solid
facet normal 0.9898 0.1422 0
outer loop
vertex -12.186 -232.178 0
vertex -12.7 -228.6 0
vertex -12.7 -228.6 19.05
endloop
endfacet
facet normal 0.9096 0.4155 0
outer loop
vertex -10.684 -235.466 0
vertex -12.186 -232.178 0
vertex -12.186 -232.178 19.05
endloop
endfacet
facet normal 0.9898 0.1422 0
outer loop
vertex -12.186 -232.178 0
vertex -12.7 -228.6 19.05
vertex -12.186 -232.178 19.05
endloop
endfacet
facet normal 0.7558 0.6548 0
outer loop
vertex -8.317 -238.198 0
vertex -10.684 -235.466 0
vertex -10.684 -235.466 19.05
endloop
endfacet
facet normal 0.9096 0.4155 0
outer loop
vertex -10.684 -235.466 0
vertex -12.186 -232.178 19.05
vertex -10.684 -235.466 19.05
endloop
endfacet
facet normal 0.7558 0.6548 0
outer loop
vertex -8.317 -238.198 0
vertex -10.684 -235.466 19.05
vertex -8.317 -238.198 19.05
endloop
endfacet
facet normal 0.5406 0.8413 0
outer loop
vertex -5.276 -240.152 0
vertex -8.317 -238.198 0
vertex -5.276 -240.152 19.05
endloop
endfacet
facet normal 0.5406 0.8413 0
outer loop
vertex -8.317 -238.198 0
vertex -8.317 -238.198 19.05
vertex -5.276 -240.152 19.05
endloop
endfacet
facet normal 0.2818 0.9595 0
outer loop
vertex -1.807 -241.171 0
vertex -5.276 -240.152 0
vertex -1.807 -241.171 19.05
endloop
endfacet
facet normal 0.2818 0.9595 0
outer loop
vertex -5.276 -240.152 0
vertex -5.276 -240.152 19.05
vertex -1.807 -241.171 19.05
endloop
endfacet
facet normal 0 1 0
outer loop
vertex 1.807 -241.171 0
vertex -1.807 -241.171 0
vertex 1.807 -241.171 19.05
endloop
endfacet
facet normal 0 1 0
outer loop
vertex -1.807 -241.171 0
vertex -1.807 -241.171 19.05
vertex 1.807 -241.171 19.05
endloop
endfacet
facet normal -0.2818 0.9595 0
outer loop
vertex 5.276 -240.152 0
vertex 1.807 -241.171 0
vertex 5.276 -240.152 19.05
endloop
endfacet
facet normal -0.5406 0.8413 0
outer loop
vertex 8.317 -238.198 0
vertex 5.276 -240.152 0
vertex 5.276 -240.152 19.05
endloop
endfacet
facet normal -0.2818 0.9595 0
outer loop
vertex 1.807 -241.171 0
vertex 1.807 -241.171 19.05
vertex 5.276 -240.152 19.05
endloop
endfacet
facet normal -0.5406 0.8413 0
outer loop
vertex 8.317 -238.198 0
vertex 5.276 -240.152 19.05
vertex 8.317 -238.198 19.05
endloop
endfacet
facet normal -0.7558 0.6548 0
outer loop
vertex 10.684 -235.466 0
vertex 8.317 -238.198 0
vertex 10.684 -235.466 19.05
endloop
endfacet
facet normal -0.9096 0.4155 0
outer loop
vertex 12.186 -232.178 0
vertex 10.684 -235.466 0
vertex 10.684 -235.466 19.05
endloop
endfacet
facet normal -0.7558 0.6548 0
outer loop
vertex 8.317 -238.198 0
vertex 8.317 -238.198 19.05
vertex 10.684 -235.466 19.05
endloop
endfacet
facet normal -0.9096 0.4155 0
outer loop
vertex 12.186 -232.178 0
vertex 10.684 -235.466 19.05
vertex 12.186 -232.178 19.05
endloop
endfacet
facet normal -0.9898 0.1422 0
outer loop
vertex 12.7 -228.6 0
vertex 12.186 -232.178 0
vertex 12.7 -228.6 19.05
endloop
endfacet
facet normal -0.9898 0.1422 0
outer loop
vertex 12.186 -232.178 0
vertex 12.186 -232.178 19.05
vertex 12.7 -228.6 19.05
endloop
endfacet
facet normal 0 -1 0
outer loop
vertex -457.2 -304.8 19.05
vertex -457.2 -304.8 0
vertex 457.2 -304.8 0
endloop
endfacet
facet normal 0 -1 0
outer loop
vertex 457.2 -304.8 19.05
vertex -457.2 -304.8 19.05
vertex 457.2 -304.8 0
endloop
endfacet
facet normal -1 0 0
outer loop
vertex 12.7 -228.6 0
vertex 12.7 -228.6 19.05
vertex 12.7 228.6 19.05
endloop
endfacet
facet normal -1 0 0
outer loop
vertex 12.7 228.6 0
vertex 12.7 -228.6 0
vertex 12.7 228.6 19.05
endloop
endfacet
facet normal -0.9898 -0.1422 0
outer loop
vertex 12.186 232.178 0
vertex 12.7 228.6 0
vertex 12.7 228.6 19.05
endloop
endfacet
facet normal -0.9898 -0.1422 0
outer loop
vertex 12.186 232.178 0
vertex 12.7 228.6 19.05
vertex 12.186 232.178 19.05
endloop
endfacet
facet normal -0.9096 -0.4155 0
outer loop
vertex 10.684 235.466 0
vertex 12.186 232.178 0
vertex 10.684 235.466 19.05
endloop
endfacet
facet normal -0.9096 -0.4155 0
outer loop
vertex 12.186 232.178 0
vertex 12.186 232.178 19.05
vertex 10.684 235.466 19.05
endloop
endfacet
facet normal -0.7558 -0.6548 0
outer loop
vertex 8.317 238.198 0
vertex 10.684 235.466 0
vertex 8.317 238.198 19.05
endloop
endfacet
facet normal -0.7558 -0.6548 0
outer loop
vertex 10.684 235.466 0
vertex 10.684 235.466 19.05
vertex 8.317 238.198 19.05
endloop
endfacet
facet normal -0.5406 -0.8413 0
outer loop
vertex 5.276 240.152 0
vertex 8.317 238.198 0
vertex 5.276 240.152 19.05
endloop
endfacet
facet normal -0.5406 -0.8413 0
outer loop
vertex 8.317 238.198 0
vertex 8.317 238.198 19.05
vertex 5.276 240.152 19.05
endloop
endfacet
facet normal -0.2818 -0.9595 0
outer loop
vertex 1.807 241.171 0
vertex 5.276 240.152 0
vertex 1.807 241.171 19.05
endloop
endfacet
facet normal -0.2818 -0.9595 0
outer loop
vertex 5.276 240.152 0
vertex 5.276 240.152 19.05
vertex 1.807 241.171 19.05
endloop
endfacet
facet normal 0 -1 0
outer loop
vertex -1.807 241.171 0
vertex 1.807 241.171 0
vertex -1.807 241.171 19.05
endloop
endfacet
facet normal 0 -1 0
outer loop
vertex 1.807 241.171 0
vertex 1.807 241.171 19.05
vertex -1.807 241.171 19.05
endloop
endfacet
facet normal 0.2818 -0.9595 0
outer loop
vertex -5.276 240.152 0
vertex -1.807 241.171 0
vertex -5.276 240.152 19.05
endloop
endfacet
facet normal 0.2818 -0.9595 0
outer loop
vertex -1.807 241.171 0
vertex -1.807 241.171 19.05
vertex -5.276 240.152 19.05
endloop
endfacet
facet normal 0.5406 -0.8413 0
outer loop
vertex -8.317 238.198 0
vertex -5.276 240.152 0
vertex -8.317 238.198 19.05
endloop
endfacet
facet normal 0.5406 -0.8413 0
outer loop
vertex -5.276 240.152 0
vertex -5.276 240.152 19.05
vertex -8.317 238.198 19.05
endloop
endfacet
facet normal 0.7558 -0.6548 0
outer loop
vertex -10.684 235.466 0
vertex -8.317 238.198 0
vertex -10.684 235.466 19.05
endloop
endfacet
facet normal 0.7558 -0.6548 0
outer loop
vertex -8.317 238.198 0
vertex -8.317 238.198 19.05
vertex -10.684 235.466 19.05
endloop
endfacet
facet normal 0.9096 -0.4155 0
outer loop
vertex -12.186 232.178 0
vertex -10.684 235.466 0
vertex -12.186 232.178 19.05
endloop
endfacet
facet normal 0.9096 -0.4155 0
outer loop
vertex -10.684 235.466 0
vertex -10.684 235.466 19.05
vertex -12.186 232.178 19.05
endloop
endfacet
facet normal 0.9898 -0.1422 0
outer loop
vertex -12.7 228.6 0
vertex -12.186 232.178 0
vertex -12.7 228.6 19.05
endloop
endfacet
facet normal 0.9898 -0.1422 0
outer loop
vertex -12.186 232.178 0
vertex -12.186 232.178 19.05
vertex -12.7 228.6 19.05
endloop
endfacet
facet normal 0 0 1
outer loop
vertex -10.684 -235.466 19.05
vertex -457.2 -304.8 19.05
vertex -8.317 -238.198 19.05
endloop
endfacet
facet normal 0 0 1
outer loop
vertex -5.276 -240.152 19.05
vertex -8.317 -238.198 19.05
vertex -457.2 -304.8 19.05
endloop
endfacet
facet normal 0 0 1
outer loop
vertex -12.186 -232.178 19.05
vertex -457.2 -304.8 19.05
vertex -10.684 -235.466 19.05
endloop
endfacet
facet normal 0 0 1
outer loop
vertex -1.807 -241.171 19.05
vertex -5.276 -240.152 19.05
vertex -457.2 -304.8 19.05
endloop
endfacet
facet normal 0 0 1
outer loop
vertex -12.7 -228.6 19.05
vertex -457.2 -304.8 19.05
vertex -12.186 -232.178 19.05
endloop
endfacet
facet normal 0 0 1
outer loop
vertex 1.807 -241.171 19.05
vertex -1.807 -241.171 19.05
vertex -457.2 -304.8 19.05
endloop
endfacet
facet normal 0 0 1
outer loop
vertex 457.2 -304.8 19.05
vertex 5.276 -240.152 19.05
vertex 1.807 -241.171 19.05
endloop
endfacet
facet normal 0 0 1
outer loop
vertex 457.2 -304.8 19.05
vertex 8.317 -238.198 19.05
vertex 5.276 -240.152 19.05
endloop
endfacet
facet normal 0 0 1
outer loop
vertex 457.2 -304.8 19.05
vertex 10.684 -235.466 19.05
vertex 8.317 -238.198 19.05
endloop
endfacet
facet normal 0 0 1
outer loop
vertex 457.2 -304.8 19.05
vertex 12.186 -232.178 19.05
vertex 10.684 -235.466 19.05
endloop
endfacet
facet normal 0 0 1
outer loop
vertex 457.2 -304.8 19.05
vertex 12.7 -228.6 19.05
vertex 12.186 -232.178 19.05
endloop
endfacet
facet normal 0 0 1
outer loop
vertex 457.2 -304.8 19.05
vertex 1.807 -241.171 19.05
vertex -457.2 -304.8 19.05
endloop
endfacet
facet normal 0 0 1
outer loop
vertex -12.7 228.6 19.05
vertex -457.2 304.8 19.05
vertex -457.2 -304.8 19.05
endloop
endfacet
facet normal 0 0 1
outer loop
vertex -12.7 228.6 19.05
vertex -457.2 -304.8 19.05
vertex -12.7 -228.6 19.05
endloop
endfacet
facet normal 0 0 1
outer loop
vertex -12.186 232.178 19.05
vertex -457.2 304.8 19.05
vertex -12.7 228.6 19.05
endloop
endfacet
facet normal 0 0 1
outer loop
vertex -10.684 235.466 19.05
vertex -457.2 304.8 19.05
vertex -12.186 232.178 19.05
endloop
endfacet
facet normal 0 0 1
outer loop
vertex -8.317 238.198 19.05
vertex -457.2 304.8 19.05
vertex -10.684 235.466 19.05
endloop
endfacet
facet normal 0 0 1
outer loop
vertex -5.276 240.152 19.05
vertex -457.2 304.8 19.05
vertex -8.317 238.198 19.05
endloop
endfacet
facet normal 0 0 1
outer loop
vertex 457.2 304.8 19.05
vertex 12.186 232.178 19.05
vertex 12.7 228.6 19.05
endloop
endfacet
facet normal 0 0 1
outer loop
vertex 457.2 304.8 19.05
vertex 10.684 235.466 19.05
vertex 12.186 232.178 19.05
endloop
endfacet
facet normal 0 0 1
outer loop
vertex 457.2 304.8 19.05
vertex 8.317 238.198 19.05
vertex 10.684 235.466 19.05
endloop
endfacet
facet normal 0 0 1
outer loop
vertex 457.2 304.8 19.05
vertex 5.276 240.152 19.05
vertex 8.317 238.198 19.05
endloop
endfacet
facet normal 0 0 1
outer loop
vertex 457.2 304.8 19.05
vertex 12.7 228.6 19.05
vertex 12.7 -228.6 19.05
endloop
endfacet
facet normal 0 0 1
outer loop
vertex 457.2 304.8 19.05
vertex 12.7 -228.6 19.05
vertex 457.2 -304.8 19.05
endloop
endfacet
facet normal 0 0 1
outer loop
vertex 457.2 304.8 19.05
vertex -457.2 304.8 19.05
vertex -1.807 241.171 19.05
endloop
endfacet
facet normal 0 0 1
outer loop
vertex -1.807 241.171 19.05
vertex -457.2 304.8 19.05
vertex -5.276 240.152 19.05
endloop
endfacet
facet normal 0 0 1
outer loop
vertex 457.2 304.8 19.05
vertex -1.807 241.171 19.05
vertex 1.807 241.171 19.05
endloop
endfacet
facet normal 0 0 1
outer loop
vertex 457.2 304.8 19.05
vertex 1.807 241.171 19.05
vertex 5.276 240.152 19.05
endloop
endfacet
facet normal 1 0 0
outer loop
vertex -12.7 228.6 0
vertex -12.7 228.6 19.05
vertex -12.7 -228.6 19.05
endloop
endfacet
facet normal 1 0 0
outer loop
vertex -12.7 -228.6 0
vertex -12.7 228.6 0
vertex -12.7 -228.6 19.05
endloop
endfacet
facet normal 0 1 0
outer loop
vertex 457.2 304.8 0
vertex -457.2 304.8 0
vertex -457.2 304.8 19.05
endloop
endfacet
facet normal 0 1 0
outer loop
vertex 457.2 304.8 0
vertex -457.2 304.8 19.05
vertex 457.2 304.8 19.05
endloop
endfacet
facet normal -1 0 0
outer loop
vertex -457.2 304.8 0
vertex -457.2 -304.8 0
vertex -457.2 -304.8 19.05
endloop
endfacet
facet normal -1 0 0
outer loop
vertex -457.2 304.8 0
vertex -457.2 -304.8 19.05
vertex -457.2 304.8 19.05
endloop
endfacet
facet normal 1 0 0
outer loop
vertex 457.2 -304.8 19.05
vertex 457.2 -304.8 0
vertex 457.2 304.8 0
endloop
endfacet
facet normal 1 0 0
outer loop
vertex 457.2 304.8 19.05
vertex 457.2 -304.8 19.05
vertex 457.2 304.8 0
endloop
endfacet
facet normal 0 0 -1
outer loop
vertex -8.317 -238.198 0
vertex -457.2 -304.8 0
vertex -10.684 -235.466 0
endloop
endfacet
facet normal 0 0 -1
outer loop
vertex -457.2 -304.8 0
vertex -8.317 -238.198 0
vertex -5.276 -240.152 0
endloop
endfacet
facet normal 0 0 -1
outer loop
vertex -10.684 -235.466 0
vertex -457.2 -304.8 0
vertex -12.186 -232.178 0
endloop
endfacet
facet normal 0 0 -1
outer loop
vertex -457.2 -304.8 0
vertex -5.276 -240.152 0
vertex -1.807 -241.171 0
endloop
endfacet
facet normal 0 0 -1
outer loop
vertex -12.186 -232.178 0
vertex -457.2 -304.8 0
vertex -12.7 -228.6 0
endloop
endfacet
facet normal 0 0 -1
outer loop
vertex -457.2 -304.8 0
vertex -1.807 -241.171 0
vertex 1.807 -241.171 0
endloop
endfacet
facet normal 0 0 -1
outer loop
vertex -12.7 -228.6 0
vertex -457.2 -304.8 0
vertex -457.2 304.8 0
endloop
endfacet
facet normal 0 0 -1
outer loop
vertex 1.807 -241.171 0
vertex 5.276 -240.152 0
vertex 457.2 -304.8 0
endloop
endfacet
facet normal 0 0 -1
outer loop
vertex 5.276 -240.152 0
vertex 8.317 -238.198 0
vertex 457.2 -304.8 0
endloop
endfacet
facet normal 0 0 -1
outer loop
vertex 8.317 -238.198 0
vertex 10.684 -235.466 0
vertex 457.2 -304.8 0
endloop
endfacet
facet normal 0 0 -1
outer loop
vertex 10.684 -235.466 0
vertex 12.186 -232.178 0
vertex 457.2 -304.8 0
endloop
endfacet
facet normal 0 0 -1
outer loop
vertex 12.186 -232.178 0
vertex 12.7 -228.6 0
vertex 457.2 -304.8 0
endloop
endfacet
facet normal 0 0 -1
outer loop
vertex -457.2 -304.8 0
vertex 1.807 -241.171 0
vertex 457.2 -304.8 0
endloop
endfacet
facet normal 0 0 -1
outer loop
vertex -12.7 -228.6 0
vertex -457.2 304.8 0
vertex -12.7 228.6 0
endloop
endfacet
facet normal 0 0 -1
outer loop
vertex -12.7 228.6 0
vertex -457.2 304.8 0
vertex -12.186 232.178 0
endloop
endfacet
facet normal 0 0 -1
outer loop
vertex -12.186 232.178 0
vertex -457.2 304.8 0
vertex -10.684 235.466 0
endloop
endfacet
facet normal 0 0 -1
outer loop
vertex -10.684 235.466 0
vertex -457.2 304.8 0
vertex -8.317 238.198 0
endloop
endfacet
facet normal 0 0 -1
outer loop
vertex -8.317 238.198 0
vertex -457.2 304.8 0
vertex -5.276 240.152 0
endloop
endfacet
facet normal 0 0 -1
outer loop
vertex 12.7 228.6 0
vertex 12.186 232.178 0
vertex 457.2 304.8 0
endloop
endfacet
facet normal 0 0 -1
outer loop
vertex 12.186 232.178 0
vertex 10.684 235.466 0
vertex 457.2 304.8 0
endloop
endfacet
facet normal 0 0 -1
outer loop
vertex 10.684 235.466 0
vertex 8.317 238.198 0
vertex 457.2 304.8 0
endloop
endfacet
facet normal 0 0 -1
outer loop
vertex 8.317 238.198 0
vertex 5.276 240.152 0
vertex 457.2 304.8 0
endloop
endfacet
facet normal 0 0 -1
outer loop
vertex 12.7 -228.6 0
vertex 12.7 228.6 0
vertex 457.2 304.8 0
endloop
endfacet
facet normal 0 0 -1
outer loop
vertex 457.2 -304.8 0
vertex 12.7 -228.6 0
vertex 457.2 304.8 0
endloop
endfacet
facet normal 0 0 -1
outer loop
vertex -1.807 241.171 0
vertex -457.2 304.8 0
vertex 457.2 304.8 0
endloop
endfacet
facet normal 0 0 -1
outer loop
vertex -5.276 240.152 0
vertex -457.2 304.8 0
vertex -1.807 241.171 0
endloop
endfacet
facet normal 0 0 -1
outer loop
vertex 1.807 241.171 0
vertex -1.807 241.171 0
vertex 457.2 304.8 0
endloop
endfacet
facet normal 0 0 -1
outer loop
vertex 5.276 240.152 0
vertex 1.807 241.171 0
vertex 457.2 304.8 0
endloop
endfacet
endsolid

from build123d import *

# Parameters (mm, degrees)
F0_W     = 914.4
F0_H     = 609.6
F1_DEPTH = 19.05
F3_DEPTH = 25.4


with BuildPart() as f1:
    # F0 (on Top) → F1 (new body)
    with BuildSketch(Plane.XY):
        Rectangle(F0_W, F0_H)
    extrude(amount=F1_DEPTH)

    # F2 (on face) → F3 (cut)
    with BuildSketch(Plane.XY.offset(19.05)):
        with BuildLine():
            Line((0, 228.6), (12.7, 228.6))
            ThreePointArc((12.7, 228.6), (0, 241.3), (-12.7, 228.6))
            Line((-12.7, 228.6), (0, 228.6))
        make_face()
        with BuildLine():
            ThreePointArc((-12.7, 228.6), (0, 215.9), (12.7, 228.6))
            Line((12.7, 228.6), (0, 228.6))
            Line((0, 228.6), (-12.7, 228.6))
        make_face()
        with BuildLine():
            ThreePointArc((-12.7, -228.6), (0, -215.9), (12.7, -228.6))
            Line((12.7, -228.6), (12.7, 228.6))
            ThreePointArc((12.7, 228.6), (0, 215.9), (-12.7, 228.6))
            Line((-12.7, 228.6), (-12.7, -228.6))
        make_face()
        with BuildLine():
            Line((0, -228.6), (12.7, -228.6))
            ThreePointArc((12.7, -228.6), (0, -215.9), (-12.7, -228.6))
            Line((-12.7, -228.6), (0, -228.6))
        make_face()
        with BuildLine():
            ThreePointArc((-12.7, -228.6), (0, -241.3), (12.7, -228.6))
            Line((12.7, -228.6), (0, -228.6))
            Line((0, -228.6), (-12.7, -228.6))
        make_face()
    extrude(amount=-F3_DEPTH, mode=Mode.SUBTRACT)


solid = f1.part
